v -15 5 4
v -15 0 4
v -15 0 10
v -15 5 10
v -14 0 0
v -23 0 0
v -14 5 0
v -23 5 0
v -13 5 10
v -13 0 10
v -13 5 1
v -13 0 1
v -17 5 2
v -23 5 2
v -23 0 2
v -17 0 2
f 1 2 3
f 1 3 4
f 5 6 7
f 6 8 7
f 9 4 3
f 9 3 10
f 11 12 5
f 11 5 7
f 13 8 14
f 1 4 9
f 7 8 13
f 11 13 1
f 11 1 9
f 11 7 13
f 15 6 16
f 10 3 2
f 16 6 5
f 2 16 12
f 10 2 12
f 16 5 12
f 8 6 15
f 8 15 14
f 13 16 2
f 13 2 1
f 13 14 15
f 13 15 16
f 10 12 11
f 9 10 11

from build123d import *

# Parameters (mm, degrees)
BOX017_W        = 10
BOX017_H        = 5
BOX017_DEPTH    = 10
CHAMFER006_SIZE = 2
BOX016_W        = 10
BOX016_H        = 5
BOX016_DEPTH    = 10
CHAMFER007_SIZE = 1


with BuildPart() as chamfer014:
    # Box017 → Box017 (new body)
    with BuildSketch(Plane(origin=(-2, 0, 2), x_dir=(1, 0, 0), z_dir=(0, 0, 1))):
        with Locations((5, 2.5)):
            Rectangle(BOX017_W, BOX017_H)
    extrude(amount=BOX017_DEPTH)

    # Chamfer006
    chamfer006_edges = [chamfer014.edges().sort_by_distance(p)[0] for p in [
        (8, 2.5, 2),
    ]]
    chamfer(chamfer006_edges, length=CHAMFER006_SIZE)


with BuildPart() as kabelf_hrung_grundk_rper_zum_ndern:
    # Box016 → Box016 (new body)
    with BuildSketch(Plane.XY):
        with Locations((5, 2.5)):
            Rectangle(BOX016_W, BOX016_H)
    extrude(amount=BOX016_DEPTH)

    # Cut001017: cut Chamfer014
    add(chamfer014.part, mode=Mode.SUBTRACT)

    # Chamfer007
    chamfer007_edges = [kabelf_hrung_grundk_rper_zum_ndern.edges().sort_by_distance(p)[0] for p in [
        (10, 2.5, 0),
    ]]
    chamfer(chamfer007_edges, length=CHAMFER007_SIZE)


with BuildPart() as kabelf_hrung_grundk_rper_zum_ndern_1:
    # Chamfer007 placement: moved
    add(kabelf_hrung_grundk_rper_zum_ndern.part.moved(Location((-23, 0, 0))))


solid = kabelf_hrung_grundk_rper_zum_ndern_1.part
